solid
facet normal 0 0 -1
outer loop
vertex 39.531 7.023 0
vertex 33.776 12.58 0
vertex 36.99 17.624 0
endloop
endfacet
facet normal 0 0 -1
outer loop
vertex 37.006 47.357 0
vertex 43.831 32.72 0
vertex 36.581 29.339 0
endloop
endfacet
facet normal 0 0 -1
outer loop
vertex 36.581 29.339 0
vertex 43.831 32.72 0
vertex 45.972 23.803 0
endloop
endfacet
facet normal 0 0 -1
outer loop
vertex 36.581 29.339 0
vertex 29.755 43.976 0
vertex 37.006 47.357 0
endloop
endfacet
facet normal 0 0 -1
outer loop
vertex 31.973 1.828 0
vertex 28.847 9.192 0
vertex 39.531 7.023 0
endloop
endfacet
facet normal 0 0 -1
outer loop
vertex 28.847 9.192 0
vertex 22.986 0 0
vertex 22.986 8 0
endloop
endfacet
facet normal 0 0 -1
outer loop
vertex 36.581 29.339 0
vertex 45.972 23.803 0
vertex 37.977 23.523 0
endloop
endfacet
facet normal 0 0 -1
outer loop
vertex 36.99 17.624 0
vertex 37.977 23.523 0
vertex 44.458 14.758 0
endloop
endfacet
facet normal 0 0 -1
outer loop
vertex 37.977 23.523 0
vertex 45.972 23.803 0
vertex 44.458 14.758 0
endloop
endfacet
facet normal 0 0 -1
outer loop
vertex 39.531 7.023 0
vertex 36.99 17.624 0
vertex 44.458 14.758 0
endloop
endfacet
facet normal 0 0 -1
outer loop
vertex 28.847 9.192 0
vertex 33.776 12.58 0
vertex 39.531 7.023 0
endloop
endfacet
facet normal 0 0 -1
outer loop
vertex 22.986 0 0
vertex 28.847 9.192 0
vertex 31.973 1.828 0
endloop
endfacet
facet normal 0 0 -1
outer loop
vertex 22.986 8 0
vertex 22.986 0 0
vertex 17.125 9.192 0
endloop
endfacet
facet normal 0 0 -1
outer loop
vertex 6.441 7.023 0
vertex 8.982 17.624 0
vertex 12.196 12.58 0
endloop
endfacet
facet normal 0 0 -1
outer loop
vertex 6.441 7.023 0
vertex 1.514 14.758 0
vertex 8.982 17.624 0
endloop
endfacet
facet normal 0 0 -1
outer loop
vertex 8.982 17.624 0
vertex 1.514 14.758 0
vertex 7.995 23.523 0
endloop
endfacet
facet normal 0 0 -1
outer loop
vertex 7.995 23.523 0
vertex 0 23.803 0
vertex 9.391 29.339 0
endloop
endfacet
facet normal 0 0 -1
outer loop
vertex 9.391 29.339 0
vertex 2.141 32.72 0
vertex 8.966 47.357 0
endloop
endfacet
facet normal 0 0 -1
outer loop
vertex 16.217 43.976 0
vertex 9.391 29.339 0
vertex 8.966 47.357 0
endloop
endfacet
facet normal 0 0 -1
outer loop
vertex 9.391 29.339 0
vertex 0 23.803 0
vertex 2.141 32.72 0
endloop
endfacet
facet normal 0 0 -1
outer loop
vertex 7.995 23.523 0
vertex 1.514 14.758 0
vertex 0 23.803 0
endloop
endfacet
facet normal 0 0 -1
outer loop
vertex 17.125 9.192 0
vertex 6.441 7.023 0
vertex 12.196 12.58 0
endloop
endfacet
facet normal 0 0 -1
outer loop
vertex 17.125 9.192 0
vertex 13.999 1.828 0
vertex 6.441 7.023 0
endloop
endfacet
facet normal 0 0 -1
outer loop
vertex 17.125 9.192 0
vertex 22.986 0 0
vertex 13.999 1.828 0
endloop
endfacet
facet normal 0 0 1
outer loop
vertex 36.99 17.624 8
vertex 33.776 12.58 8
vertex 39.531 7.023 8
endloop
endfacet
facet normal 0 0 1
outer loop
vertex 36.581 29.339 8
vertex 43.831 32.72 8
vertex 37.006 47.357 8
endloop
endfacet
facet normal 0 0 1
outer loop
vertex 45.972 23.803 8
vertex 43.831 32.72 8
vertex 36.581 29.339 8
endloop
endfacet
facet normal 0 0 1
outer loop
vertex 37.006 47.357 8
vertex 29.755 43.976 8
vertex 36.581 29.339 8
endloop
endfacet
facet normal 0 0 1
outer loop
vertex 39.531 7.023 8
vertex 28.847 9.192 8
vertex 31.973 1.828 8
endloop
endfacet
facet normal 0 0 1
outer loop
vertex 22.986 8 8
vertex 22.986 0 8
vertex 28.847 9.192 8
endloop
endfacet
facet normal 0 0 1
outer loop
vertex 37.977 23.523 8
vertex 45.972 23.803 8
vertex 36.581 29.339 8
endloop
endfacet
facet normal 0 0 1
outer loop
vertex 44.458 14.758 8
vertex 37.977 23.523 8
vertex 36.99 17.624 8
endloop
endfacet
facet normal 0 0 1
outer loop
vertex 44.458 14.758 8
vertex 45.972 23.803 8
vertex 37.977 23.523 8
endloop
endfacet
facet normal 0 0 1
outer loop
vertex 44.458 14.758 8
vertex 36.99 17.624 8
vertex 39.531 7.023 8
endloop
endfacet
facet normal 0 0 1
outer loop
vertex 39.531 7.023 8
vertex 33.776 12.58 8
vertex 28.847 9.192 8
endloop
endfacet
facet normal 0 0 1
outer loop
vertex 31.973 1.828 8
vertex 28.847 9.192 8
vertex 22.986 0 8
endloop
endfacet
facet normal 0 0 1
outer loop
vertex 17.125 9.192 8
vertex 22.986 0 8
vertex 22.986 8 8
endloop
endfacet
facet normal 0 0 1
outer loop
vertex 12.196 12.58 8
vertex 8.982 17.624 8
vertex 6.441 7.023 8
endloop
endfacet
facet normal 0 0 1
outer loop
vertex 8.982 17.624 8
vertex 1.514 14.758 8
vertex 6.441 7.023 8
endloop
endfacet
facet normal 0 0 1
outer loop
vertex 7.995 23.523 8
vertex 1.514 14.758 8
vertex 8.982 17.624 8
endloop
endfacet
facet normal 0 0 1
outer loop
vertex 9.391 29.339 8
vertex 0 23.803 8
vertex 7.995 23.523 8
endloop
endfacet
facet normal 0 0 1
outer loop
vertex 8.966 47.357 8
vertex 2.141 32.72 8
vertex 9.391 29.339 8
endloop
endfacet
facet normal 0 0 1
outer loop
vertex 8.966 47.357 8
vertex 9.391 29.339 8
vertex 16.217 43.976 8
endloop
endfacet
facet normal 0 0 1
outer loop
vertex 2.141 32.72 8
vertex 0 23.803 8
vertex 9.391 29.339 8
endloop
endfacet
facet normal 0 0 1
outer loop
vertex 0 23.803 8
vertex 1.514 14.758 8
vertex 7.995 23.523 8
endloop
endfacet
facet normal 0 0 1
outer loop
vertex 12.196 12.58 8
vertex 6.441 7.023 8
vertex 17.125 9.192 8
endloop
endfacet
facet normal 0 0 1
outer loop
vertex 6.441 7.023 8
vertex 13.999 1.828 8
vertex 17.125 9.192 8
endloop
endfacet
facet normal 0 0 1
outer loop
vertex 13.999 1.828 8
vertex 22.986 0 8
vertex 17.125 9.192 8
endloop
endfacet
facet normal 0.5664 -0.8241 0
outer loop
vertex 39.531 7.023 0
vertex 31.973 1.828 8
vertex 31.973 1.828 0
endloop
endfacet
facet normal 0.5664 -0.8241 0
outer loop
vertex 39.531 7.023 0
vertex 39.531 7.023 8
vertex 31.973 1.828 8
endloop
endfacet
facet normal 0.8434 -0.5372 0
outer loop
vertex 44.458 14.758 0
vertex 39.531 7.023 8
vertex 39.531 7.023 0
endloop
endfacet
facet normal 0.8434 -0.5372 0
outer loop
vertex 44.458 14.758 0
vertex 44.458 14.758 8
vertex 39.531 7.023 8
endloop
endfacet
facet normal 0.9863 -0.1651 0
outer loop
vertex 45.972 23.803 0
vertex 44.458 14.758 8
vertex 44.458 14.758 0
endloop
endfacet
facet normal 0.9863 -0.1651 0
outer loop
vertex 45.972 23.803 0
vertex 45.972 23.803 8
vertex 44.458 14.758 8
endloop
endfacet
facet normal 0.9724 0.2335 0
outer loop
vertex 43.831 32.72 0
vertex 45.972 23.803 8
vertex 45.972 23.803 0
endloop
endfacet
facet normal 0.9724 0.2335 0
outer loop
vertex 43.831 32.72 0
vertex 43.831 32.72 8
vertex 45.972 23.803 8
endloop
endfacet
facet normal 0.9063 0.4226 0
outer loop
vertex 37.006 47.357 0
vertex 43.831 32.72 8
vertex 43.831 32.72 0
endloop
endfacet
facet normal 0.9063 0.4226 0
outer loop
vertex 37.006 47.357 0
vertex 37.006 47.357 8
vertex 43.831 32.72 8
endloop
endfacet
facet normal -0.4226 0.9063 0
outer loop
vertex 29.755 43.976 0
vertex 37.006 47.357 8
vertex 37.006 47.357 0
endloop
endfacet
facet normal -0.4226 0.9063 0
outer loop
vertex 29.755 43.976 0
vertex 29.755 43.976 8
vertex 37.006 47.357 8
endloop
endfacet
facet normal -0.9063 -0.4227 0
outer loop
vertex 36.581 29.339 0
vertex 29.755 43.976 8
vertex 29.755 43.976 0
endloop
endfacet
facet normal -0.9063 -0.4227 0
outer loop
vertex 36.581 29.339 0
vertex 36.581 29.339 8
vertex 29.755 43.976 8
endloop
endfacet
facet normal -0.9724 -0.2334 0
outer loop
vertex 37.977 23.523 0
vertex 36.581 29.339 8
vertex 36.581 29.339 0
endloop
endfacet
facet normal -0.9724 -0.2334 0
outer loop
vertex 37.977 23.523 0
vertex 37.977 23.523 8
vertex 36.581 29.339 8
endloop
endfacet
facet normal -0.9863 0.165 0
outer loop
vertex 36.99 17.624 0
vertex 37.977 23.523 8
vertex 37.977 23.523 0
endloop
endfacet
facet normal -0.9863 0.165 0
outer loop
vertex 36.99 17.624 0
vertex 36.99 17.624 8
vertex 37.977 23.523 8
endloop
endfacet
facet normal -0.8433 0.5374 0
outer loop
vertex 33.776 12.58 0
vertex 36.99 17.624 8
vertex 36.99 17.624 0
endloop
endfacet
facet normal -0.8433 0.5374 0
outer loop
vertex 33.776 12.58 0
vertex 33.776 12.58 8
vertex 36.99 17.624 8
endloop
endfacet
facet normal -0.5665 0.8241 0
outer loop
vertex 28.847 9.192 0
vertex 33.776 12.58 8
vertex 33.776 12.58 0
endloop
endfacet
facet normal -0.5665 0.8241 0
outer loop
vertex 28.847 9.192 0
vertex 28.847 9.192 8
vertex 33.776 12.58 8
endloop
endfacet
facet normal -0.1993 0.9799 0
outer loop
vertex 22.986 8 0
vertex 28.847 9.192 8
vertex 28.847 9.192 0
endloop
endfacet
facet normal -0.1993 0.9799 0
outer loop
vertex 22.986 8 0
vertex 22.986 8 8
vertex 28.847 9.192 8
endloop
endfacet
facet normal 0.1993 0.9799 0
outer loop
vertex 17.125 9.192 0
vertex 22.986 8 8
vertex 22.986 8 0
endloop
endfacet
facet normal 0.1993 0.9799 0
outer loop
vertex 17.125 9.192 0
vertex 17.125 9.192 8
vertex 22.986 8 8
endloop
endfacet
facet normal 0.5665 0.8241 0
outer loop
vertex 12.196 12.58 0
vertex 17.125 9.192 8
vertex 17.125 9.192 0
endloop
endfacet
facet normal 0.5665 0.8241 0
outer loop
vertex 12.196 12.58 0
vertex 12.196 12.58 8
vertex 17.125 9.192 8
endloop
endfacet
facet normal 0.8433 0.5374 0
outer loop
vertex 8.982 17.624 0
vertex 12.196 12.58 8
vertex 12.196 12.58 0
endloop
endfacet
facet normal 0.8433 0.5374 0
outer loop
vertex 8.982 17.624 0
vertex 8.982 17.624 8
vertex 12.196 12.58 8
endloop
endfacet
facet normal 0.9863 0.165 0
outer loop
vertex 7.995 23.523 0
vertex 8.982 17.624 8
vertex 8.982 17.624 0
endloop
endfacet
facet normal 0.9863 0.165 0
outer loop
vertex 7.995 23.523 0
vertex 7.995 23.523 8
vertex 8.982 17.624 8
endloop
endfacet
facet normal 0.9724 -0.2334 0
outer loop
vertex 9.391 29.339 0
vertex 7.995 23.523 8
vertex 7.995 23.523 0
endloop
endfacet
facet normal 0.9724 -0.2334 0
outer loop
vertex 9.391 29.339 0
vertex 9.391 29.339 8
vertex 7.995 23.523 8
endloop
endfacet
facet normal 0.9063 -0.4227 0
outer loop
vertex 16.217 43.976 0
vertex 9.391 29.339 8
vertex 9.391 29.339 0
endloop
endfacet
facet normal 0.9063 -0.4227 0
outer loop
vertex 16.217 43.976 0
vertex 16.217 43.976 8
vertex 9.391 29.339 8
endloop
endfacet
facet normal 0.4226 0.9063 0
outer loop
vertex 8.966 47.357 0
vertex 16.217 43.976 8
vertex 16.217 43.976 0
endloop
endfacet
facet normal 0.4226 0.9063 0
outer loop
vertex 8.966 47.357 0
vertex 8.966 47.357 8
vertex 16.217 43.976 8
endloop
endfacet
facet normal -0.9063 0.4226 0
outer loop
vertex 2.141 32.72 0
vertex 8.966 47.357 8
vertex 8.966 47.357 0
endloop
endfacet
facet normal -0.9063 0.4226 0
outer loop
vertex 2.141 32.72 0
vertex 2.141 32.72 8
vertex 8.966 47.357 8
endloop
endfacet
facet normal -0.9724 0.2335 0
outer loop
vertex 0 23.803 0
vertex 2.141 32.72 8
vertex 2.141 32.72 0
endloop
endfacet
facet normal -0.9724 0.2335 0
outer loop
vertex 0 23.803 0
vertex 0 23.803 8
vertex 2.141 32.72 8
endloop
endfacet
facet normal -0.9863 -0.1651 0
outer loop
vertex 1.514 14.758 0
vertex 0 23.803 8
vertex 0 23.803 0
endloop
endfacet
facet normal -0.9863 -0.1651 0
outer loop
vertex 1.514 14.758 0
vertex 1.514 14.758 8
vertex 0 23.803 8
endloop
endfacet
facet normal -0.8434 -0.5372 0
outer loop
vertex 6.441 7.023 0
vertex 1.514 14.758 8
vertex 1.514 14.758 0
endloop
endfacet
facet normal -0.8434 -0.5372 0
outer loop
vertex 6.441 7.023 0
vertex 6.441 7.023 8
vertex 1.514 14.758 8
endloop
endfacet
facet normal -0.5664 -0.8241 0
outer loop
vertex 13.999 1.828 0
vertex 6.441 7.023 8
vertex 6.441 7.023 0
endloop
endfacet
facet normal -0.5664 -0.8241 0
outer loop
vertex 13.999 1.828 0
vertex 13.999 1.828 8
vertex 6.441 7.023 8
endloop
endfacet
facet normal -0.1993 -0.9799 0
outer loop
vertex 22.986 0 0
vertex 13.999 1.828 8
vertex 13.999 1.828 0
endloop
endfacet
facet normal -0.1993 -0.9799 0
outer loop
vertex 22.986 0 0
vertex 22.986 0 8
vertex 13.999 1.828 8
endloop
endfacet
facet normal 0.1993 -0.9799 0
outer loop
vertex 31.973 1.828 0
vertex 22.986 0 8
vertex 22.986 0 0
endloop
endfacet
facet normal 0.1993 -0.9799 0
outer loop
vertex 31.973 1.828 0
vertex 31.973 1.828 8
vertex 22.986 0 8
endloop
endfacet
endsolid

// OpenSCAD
$fn = 32;

// ----------------------------------------------------------------------
// Clip blank: omega clip, 8 mm thick
// ----------------------------------------------------------------------

// --- parameters (mm) ---
profile_height = 8;       // extrusion height
profile_points = 26;      // points of the closed outline

profile = [[2.141, 32.72], [0, 23.803], [1.514, 14.758], [6.441, 7.023], [13.999, 1.828], [22.986, 0], [31.973, 1.828], [39.531, 7.023], [44.458, 14.758], [45.972, 23.803], [43.831, 32.72], [37.006, 47.357], [29.755, 43.976], [36.581, 29.339], [37.977, 23.523], [36.99, 17.624], [33.776, 12.58], [28.847, 9.192], [22.986, 8], [17.125, 9.192], [12.196, 12.58], [8.982, 17.624], [7.995, 23.523], [9.391, 29.339], [16.217, 43.976], [8.966, 47.357]];  // single closed polygon, 26 points, counter clockwise

// --- the one profile operation ---
linear_extrude(height = profile_height) polygon(points = profile);
